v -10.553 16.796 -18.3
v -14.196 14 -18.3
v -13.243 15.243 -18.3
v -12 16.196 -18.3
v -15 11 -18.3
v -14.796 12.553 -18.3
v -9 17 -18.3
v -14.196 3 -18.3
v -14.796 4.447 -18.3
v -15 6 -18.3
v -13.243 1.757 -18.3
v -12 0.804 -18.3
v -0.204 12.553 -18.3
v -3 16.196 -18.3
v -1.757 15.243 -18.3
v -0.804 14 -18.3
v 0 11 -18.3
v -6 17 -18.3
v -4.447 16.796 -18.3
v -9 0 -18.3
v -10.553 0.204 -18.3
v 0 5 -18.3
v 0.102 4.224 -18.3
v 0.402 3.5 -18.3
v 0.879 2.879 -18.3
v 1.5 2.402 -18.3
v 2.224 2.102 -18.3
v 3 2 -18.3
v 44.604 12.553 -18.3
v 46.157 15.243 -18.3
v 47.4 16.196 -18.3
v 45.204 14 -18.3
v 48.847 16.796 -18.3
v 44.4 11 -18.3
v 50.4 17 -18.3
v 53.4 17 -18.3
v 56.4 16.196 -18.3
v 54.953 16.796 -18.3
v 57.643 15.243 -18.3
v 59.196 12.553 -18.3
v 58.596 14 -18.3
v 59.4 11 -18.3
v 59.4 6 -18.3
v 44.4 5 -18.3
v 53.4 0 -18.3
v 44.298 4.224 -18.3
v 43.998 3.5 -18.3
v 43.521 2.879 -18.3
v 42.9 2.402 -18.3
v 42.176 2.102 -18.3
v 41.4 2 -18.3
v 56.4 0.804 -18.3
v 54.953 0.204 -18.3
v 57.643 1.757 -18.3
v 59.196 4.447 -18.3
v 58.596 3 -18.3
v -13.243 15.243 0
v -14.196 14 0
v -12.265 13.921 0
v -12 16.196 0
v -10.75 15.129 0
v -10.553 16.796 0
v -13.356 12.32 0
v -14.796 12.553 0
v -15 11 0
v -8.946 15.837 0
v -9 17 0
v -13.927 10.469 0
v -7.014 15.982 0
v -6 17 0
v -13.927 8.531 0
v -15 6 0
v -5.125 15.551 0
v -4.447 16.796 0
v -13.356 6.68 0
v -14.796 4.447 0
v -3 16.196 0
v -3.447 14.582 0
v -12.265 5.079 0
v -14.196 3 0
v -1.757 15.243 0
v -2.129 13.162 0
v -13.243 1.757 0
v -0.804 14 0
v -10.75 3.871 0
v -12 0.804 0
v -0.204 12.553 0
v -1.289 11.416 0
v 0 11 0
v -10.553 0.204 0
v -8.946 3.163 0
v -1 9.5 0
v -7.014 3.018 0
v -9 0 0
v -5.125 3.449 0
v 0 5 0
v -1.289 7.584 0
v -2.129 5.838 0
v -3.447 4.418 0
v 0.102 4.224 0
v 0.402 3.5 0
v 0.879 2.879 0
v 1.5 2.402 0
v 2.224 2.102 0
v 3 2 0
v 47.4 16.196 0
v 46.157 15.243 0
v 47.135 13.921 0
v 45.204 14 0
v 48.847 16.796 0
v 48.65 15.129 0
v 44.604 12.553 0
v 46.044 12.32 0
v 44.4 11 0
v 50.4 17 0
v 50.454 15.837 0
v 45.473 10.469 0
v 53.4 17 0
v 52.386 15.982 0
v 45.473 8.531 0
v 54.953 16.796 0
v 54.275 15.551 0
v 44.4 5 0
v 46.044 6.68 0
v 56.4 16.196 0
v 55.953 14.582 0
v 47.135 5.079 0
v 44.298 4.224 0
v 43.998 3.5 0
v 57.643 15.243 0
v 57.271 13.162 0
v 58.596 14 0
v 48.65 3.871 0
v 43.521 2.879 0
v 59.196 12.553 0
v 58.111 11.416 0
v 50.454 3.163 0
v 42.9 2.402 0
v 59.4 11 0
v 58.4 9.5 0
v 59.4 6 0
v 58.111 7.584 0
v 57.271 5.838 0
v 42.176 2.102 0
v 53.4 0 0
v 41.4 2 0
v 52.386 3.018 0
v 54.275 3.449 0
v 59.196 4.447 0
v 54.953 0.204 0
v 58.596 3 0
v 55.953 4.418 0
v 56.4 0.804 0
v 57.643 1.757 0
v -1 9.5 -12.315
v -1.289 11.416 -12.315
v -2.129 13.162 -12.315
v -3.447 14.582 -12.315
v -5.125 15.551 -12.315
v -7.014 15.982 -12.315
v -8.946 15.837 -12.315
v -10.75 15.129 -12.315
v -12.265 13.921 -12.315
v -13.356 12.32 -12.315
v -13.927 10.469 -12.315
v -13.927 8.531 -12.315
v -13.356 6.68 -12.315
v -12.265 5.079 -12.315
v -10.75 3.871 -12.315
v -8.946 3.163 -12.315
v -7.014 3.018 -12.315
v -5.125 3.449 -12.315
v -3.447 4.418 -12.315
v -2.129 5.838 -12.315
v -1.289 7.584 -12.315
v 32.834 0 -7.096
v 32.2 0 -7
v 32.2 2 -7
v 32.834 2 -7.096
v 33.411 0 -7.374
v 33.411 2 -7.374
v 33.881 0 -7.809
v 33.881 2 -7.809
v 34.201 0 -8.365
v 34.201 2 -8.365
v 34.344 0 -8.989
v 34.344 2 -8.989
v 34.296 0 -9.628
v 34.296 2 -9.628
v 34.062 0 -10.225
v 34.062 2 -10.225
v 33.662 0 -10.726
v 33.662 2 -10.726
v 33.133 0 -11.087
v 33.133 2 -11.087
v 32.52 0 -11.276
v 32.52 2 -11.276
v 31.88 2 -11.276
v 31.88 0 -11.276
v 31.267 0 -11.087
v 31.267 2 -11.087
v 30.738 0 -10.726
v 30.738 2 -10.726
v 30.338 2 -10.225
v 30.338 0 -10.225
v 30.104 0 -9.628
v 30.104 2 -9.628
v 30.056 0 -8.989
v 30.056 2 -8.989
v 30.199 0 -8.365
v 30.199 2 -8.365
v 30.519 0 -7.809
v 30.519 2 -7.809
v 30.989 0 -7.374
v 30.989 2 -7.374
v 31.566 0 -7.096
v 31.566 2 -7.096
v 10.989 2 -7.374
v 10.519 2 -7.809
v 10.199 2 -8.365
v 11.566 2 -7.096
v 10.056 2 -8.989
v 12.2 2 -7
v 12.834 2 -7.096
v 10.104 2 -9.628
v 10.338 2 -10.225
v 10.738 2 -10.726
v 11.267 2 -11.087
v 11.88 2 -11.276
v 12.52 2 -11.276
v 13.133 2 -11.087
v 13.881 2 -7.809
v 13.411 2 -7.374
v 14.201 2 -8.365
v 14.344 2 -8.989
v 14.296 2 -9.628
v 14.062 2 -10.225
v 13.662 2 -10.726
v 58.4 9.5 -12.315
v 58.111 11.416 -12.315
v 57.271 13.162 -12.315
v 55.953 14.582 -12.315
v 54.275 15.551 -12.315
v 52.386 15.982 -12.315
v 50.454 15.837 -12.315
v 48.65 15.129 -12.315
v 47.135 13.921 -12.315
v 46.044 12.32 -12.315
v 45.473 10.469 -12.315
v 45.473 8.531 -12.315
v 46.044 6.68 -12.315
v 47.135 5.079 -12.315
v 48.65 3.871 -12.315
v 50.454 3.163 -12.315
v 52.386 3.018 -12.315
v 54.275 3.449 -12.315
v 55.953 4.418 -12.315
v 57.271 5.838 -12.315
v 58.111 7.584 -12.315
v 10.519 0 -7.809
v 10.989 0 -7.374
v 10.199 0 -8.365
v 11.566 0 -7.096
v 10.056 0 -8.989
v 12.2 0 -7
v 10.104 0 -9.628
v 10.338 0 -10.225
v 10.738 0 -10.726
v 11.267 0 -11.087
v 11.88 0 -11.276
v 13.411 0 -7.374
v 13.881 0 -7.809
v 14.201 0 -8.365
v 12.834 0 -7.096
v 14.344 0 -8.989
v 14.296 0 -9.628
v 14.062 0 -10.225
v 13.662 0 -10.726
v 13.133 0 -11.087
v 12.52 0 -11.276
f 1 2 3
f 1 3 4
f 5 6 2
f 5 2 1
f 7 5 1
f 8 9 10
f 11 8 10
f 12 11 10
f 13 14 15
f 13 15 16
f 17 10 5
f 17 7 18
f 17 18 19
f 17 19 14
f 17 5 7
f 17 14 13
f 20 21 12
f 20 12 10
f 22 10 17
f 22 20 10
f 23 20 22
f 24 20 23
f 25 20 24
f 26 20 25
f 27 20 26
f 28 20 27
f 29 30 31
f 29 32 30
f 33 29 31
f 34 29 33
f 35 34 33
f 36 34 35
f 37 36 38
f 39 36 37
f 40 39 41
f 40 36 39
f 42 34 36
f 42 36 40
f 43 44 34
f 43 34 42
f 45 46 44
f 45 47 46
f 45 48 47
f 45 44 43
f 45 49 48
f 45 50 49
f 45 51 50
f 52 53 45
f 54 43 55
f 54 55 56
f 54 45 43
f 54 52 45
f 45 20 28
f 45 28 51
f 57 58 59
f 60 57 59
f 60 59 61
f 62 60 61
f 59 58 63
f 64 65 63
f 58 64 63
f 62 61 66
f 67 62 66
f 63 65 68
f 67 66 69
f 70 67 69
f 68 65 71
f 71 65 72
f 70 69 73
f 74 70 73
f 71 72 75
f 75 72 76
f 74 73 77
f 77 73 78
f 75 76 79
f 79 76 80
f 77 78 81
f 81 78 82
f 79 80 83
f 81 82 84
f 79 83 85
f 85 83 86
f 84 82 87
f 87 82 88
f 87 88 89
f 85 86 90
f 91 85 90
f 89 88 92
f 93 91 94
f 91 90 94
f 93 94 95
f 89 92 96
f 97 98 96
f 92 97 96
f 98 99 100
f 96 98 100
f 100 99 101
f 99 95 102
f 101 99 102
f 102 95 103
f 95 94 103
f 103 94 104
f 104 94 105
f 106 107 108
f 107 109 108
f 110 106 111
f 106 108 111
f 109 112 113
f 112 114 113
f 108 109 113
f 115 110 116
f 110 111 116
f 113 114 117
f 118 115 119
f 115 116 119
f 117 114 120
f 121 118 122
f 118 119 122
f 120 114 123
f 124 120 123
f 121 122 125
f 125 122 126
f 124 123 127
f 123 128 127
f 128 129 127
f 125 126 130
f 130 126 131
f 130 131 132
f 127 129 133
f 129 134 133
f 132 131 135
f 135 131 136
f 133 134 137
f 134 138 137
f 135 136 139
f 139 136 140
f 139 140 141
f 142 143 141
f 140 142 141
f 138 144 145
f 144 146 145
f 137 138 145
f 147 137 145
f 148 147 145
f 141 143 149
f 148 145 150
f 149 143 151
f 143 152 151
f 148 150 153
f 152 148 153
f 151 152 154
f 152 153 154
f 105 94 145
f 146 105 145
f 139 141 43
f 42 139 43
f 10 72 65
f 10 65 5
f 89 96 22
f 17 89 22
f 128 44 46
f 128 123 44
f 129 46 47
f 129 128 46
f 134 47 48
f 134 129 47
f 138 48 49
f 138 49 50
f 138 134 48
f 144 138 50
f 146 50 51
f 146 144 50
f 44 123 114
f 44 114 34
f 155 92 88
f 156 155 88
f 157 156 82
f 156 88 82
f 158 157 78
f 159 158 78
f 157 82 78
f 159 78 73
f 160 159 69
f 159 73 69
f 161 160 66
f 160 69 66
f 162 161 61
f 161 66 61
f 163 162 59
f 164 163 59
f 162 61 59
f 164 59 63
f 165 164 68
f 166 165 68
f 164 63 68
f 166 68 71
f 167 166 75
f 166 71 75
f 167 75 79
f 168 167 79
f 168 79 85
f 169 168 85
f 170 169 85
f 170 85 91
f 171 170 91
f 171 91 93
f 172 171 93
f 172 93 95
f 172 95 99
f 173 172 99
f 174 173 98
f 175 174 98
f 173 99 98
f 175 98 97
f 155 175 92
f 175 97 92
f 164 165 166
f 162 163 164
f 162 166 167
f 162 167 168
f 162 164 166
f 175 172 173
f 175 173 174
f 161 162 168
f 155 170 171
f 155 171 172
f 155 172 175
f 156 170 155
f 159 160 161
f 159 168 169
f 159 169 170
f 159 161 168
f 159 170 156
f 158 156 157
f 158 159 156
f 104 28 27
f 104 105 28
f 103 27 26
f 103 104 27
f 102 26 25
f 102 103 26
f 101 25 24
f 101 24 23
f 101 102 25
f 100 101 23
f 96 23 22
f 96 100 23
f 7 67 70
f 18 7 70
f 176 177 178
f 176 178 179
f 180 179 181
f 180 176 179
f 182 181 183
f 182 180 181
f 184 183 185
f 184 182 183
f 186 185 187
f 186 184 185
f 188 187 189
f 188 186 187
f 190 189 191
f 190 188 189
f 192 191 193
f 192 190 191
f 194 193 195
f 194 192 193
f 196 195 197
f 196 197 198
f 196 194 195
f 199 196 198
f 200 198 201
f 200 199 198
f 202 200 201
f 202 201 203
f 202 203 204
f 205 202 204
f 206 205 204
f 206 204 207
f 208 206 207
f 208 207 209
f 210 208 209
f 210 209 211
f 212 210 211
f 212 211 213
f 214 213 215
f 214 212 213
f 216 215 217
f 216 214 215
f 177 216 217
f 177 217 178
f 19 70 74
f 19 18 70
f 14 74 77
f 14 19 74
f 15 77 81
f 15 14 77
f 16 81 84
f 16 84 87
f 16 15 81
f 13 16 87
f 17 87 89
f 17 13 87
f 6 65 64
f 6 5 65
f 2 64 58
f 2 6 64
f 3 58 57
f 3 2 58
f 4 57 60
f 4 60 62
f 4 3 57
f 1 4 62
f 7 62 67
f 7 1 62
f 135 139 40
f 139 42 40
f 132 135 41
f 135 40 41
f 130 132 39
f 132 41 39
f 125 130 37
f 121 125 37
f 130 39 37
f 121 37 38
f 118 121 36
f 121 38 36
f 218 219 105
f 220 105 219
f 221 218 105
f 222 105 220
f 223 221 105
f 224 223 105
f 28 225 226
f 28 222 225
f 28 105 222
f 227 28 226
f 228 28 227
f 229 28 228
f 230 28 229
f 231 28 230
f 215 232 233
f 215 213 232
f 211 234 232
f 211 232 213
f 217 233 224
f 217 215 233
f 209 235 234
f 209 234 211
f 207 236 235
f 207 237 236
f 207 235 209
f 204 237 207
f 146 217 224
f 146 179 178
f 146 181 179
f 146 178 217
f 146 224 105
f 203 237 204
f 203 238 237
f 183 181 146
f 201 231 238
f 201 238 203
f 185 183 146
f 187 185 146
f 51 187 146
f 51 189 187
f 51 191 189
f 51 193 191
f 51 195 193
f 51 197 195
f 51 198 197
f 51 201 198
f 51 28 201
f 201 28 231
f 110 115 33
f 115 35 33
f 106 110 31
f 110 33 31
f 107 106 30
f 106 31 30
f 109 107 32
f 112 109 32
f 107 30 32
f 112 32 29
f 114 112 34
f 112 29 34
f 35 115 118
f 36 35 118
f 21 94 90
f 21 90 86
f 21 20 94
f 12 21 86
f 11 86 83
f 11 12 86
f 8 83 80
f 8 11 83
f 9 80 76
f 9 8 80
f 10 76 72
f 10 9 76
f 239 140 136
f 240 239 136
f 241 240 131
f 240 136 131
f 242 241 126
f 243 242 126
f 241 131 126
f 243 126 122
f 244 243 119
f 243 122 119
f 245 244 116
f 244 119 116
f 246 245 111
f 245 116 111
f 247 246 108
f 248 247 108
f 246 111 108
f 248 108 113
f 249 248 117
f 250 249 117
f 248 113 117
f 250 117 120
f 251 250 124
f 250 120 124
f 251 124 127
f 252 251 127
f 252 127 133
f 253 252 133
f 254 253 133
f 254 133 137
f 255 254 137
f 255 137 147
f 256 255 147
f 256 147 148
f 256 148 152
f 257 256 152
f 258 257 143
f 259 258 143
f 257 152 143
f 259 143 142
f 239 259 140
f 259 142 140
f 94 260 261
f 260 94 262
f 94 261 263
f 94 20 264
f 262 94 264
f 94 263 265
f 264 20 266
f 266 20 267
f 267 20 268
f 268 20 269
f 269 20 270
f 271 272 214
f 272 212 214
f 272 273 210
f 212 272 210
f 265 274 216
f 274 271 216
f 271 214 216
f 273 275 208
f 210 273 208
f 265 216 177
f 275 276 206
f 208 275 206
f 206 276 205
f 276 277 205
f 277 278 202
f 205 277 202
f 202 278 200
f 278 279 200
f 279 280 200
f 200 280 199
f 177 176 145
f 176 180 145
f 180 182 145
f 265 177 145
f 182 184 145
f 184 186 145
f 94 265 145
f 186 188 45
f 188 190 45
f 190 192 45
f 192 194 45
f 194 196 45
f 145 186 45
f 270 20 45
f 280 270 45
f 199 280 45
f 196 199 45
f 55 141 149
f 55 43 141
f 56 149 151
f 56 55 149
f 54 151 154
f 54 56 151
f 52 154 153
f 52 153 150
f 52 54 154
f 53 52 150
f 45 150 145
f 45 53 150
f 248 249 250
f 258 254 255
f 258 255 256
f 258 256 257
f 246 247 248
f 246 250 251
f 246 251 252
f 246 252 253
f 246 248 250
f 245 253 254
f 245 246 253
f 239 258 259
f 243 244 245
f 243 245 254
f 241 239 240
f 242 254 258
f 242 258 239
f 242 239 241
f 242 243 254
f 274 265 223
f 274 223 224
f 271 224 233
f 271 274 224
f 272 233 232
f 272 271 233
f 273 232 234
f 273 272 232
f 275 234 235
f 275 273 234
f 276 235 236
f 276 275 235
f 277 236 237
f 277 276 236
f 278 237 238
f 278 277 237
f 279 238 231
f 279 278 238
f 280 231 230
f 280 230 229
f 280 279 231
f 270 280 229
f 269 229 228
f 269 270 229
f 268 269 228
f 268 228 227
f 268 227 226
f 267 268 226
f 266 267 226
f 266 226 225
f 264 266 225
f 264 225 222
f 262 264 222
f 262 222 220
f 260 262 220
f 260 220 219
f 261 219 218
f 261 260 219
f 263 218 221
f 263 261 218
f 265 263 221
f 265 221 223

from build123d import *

# Parameters (mm, degrees)
SKETCH1_W           = 15
SKETCH1_H           = 18.3
SKETCH1_W_2         = 44.4
SKETCH1_R           = 2.15
BOSS_EXTRUDE1_DEPTH = 2
SKETCH1_3_W         = 15
SKETCH1_3_H         = 18.3
BOSS_EXTRUDE2_DEPTH = 17
SKETCH2_R           = 6.5
CUT_EXTRUDE2_DEPTH  = 12.315
FILLET3_R           = 6
FILLET4_R           = 3


with BuildPart() as part:
    # Sketch1 → Boss-Extrude1 (new body)
    # profile 1 of 3: a face of its own
    with BuildSketch(Plane(origin=(0, 0, 0), x_dir=(1, 0, 0), z_dir=(0, 1, 0))):
        with Locations((-7.5, 9.15)):
            Rectangle(SKETCH1_W, SKETCH1_H)
    # profile 2 of 3: a face of its own
    with BuildSketch(Plane(origin=(0, 0, 0), x_dir=(1, 0, 0), z_dir=(0, 1, 0))):
        with Locations((22.2, 9.15)):
            Rectangle(SKETCH1_W_2, SKETCH1_H)
        with Locations(Location((32.2, 9.15, 0), (0, 0, 270))):
            Circle(SKETCH1_R, mode=Mode.SUBTRACT)
        with Locations(Location((12.2, 9.15, 0), (0, 0, 270))):
            Circle(SKETCH1_R, mode=Mode.SUBTRACT)
    # profile 3 of 3: a face of its own
    with BuildSketch(Plane(origin=(0, 0, 0), x_dir=(1, 0, 0), z_dir=(0, 1, 0))):
        with Locations((51.9, 9.15)):
            Rectangle(SKETCH1_W, SKETCH1_H)
    extrude(amount=BOSS_EXTRUDE1_DEPTH)

    # Sketch1<3> → Boss-Extrude2 (add)
    with BuildSketch(Plane(origin=(0, 0, 0), x_dir=(1, 0, 0), z_dir=(0, 1, 0))):
        with Locations((51.9, 9.15)):
            Rectangle(SKETCH1_3_W, SKETCH1_3_H)
        with Locations((-7.5, 9.15)):
            Rectangle(SKETCH1_3_W, SKETCH1_3_H)
    extrude(amount=BOSS_EXTRUDE2_DEPTH)

    # Sketch2 → Cut-Extrude2 (cut)
    with BuildSketch(Plane.XY):
        with Locations((-7.5, 9.5)):
            Circle(SKETCH2_R)
        with Locations((51.9, 9.5)):
            Circle(SKETCH2_R)
    extrude(amount=-CUT_EXTRUDE2_DEPTH, mode=Mode.SUBTRACT)

    # Fillet3
    fillet3_edges = [part.edges().sort_by_distance(p)[0] for p in [
        (59.4, 0, -9.15),
        (-15, 0, -9.15),
        (44.4, 17, -9.15),
        (59.4, 17, -9.15),
        (-15, 17, -9.15),
        (0, 17, -9.15),
    ]]
    fillet(fillet3_edges, radius=FILLET3_R)

    # Fillet4
    fillet4_edges = [part.edges().sort_by_distance(p)[0] for p in [
        (44.4, 2, -9.15),
        (0, 2, -9.15),
    ]]
    fillet(fillet4_edges, radius=FILLET4_R)


solid = part.part
